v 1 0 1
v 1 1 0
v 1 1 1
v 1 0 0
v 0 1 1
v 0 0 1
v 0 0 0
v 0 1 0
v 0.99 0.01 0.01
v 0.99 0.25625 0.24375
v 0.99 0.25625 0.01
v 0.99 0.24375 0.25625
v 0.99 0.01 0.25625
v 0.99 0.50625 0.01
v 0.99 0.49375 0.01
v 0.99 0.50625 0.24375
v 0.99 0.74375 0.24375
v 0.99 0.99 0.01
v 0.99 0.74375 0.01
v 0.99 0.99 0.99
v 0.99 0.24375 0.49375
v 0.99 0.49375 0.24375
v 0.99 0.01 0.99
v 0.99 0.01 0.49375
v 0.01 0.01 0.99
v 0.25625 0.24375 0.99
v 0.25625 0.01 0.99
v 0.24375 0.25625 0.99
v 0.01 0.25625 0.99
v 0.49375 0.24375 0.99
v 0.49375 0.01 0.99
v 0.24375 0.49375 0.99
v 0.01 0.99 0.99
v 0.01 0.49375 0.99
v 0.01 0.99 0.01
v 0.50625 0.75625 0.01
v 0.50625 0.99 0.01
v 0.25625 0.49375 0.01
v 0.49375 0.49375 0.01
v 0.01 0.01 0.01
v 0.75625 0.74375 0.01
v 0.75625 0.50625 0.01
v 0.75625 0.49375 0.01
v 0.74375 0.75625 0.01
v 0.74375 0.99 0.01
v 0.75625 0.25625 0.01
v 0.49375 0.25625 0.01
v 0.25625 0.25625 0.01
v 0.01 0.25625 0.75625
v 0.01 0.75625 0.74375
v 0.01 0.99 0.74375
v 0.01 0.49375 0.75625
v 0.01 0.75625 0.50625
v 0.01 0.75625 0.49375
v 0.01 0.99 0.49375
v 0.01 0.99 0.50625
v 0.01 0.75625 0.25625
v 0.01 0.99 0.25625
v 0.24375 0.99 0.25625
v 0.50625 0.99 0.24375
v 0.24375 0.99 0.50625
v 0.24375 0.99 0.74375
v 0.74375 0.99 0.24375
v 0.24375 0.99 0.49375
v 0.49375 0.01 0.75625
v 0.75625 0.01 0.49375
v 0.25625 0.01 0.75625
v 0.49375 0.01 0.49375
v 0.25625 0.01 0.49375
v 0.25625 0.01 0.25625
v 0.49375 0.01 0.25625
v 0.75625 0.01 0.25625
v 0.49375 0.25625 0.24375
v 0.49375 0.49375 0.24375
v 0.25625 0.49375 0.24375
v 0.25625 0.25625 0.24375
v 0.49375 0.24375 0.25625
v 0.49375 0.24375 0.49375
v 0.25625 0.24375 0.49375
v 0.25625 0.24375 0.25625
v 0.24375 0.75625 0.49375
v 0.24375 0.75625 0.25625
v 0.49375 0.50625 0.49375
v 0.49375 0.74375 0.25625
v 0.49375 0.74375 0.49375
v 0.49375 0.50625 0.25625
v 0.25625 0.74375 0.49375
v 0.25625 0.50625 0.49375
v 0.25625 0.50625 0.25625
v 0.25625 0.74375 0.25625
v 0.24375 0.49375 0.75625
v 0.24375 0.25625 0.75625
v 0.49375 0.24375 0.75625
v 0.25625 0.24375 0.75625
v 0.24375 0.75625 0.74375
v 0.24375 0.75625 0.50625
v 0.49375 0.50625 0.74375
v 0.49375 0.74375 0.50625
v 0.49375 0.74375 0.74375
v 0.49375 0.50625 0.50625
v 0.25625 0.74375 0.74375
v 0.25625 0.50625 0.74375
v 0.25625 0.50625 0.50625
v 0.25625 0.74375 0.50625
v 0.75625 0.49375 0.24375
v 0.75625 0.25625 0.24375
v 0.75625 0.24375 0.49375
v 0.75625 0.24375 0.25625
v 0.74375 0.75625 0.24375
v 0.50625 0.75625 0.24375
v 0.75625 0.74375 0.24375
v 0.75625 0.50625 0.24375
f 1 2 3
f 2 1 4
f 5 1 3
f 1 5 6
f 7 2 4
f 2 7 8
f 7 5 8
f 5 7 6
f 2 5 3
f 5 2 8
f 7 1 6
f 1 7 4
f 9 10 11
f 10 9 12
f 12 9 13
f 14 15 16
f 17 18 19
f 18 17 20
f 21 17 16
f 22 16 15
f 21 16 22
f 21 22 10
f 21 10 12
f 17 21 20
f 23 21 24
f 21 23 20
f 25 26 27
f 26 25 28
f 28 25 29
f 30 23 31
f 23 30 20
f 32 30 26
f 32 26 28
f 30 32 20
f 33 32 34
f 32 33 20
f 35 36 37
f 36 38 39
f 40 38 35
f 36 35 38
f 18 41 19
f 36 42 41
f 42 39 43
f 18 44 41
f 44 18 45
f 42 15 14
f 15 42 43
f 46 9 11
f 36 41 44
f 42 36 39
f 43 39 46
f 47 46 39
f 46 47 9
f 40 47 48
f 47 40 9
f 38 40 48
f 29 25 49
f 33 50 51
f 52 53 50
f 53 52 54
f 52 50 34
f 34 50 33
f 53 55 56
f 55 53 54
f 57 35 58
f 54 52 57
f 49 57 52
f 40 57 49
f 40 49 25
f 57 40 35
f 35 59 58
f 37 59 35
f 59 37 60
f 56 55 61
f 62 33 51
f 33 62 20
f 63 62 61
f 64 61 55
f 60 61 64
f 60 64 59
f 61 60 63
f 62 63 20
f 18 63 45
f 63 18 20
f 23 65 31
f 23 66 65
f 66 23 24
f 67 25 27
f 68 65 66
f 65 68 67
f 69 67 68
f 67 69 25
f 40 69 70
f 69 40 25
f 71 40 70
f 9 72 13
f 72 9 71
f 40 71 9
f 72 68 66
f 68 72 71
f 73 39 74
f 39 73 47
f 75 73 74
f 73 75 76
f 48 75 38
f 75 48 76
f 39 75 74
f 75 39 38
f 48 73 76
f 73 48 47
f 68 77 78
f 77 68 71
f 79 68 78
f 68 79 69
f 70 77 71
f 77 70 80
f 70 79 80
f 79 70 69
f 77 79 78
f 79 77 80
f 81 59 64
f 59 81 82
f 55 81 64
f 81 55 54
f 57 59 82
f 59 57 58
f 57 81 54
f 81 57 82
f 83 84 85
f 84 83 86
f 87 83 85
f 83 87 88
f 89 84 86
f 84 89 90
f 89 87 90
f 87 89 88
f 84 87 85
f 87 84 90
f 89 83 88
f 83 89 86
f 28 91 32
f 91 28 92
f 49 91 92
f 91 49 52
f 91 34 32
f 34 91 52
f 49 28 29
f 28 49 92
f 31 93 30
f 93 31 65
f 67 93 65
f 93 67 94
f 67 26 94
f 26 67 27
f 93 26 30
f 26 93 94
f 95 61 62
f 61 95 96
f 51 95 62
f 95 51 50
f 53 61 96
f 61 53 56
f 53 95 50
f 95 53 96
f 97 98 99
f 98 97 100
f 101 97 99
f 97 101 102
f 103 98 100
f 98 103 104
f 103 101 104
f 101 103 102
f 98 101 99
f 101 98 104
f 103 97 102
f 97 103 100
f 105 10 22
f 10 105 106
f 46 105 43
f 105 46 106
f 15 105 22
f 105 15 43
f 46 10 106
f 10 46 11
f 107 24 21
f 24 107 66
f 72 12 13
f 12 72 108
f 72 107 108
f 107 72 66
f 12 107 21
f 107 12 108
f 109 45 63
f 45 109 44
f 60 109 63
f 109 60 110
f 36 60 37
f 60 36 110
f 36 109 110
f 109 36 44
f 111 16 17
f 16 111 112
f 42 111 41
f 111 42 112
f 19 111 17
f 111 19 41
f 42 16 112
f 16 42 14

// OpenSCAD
translate([0.375, 0.375, 0.125]) color([0.4009670746604762, 0.32173203192271393, 0.553082009505837]) cube([0.2375, 0.2375, 0.2375], center=true);
translate([0.375, 0.125, 0.375]) color([0.3256937881953724, 0.9109963078438346, 0.13412178984042844]) cube([0.2375, 0.2375, 0.2375], center=true);
translate([0.125, 0.875, 0.375]) color([0.16837589335630898, 0.8764134615484998, 0.07351501458473586]) cube([0.2375, 0.2375, 0.2375], center=true);
translate([0.375, 0.625, 0.375]) color([0.18861772816501654, 0.2995636798725818, 0.6373620141013281]) cube([0.2375, 0.2375, 0.2375], center=true);
translate([0.125, 0.375, 0.875]) color([0.4415437475553168, 0.7961450490178668, 0.84634125377522]) cube([0.2375, 0.2375, 0.2375], center=true);
translate([0.375, 0.125, 0.875]) color([0.8916592015510378, 0.14182509993947134, 0.48137274701024935]) cube([0.2375, 0.2375, 0.2375], center=true);
translate([0.125, 0.875, 0.625]) color([0.5064966308665176, 0.3611716642845566, 0.4929690929227817]) cube([0.2375, 0.2375, 0.2375], center=true);
translate([0.375, 0.625, 0.625]) color([0.33975835656900355, 0.19140748203007008, 0.9037004397118625]) cube([0.2375, 0.2375, 0.2375], center=true);
translate([0.875, 0.375, 0.125]) color([0.22105114979588647, 0.7119011916453704, 0.13344329368444563]) cube([0.2375, 0.2375, 0.2375], center=true);
translate([0.875, 0.125, 0.375]) color([0.4275590222113661, 0.9470347016445155, 0.3426119792791571]) cube([0.2375, 0.2375, 0.2375], center=true);
translate([0.625, 0.875, 0.125]) color([0.3987605823857824, 0.04971247072134921, 0.27732972371438613]) cube([0.2375, 0.2375, 0.2375], center=true);
translate([0.875, 0.625, 0.125]) color([0.9851647718611997, 0.6384503739598667, 0.3871269652437943]) cube([0.2375, 0.2375, 0.2375], center=true);
color([0.3,0.3,0.3,0.3]) difference() { cube([1,1,1]); translate([0.01,0.01,0.01]) cube([0.98,0.98,0.98]); }
